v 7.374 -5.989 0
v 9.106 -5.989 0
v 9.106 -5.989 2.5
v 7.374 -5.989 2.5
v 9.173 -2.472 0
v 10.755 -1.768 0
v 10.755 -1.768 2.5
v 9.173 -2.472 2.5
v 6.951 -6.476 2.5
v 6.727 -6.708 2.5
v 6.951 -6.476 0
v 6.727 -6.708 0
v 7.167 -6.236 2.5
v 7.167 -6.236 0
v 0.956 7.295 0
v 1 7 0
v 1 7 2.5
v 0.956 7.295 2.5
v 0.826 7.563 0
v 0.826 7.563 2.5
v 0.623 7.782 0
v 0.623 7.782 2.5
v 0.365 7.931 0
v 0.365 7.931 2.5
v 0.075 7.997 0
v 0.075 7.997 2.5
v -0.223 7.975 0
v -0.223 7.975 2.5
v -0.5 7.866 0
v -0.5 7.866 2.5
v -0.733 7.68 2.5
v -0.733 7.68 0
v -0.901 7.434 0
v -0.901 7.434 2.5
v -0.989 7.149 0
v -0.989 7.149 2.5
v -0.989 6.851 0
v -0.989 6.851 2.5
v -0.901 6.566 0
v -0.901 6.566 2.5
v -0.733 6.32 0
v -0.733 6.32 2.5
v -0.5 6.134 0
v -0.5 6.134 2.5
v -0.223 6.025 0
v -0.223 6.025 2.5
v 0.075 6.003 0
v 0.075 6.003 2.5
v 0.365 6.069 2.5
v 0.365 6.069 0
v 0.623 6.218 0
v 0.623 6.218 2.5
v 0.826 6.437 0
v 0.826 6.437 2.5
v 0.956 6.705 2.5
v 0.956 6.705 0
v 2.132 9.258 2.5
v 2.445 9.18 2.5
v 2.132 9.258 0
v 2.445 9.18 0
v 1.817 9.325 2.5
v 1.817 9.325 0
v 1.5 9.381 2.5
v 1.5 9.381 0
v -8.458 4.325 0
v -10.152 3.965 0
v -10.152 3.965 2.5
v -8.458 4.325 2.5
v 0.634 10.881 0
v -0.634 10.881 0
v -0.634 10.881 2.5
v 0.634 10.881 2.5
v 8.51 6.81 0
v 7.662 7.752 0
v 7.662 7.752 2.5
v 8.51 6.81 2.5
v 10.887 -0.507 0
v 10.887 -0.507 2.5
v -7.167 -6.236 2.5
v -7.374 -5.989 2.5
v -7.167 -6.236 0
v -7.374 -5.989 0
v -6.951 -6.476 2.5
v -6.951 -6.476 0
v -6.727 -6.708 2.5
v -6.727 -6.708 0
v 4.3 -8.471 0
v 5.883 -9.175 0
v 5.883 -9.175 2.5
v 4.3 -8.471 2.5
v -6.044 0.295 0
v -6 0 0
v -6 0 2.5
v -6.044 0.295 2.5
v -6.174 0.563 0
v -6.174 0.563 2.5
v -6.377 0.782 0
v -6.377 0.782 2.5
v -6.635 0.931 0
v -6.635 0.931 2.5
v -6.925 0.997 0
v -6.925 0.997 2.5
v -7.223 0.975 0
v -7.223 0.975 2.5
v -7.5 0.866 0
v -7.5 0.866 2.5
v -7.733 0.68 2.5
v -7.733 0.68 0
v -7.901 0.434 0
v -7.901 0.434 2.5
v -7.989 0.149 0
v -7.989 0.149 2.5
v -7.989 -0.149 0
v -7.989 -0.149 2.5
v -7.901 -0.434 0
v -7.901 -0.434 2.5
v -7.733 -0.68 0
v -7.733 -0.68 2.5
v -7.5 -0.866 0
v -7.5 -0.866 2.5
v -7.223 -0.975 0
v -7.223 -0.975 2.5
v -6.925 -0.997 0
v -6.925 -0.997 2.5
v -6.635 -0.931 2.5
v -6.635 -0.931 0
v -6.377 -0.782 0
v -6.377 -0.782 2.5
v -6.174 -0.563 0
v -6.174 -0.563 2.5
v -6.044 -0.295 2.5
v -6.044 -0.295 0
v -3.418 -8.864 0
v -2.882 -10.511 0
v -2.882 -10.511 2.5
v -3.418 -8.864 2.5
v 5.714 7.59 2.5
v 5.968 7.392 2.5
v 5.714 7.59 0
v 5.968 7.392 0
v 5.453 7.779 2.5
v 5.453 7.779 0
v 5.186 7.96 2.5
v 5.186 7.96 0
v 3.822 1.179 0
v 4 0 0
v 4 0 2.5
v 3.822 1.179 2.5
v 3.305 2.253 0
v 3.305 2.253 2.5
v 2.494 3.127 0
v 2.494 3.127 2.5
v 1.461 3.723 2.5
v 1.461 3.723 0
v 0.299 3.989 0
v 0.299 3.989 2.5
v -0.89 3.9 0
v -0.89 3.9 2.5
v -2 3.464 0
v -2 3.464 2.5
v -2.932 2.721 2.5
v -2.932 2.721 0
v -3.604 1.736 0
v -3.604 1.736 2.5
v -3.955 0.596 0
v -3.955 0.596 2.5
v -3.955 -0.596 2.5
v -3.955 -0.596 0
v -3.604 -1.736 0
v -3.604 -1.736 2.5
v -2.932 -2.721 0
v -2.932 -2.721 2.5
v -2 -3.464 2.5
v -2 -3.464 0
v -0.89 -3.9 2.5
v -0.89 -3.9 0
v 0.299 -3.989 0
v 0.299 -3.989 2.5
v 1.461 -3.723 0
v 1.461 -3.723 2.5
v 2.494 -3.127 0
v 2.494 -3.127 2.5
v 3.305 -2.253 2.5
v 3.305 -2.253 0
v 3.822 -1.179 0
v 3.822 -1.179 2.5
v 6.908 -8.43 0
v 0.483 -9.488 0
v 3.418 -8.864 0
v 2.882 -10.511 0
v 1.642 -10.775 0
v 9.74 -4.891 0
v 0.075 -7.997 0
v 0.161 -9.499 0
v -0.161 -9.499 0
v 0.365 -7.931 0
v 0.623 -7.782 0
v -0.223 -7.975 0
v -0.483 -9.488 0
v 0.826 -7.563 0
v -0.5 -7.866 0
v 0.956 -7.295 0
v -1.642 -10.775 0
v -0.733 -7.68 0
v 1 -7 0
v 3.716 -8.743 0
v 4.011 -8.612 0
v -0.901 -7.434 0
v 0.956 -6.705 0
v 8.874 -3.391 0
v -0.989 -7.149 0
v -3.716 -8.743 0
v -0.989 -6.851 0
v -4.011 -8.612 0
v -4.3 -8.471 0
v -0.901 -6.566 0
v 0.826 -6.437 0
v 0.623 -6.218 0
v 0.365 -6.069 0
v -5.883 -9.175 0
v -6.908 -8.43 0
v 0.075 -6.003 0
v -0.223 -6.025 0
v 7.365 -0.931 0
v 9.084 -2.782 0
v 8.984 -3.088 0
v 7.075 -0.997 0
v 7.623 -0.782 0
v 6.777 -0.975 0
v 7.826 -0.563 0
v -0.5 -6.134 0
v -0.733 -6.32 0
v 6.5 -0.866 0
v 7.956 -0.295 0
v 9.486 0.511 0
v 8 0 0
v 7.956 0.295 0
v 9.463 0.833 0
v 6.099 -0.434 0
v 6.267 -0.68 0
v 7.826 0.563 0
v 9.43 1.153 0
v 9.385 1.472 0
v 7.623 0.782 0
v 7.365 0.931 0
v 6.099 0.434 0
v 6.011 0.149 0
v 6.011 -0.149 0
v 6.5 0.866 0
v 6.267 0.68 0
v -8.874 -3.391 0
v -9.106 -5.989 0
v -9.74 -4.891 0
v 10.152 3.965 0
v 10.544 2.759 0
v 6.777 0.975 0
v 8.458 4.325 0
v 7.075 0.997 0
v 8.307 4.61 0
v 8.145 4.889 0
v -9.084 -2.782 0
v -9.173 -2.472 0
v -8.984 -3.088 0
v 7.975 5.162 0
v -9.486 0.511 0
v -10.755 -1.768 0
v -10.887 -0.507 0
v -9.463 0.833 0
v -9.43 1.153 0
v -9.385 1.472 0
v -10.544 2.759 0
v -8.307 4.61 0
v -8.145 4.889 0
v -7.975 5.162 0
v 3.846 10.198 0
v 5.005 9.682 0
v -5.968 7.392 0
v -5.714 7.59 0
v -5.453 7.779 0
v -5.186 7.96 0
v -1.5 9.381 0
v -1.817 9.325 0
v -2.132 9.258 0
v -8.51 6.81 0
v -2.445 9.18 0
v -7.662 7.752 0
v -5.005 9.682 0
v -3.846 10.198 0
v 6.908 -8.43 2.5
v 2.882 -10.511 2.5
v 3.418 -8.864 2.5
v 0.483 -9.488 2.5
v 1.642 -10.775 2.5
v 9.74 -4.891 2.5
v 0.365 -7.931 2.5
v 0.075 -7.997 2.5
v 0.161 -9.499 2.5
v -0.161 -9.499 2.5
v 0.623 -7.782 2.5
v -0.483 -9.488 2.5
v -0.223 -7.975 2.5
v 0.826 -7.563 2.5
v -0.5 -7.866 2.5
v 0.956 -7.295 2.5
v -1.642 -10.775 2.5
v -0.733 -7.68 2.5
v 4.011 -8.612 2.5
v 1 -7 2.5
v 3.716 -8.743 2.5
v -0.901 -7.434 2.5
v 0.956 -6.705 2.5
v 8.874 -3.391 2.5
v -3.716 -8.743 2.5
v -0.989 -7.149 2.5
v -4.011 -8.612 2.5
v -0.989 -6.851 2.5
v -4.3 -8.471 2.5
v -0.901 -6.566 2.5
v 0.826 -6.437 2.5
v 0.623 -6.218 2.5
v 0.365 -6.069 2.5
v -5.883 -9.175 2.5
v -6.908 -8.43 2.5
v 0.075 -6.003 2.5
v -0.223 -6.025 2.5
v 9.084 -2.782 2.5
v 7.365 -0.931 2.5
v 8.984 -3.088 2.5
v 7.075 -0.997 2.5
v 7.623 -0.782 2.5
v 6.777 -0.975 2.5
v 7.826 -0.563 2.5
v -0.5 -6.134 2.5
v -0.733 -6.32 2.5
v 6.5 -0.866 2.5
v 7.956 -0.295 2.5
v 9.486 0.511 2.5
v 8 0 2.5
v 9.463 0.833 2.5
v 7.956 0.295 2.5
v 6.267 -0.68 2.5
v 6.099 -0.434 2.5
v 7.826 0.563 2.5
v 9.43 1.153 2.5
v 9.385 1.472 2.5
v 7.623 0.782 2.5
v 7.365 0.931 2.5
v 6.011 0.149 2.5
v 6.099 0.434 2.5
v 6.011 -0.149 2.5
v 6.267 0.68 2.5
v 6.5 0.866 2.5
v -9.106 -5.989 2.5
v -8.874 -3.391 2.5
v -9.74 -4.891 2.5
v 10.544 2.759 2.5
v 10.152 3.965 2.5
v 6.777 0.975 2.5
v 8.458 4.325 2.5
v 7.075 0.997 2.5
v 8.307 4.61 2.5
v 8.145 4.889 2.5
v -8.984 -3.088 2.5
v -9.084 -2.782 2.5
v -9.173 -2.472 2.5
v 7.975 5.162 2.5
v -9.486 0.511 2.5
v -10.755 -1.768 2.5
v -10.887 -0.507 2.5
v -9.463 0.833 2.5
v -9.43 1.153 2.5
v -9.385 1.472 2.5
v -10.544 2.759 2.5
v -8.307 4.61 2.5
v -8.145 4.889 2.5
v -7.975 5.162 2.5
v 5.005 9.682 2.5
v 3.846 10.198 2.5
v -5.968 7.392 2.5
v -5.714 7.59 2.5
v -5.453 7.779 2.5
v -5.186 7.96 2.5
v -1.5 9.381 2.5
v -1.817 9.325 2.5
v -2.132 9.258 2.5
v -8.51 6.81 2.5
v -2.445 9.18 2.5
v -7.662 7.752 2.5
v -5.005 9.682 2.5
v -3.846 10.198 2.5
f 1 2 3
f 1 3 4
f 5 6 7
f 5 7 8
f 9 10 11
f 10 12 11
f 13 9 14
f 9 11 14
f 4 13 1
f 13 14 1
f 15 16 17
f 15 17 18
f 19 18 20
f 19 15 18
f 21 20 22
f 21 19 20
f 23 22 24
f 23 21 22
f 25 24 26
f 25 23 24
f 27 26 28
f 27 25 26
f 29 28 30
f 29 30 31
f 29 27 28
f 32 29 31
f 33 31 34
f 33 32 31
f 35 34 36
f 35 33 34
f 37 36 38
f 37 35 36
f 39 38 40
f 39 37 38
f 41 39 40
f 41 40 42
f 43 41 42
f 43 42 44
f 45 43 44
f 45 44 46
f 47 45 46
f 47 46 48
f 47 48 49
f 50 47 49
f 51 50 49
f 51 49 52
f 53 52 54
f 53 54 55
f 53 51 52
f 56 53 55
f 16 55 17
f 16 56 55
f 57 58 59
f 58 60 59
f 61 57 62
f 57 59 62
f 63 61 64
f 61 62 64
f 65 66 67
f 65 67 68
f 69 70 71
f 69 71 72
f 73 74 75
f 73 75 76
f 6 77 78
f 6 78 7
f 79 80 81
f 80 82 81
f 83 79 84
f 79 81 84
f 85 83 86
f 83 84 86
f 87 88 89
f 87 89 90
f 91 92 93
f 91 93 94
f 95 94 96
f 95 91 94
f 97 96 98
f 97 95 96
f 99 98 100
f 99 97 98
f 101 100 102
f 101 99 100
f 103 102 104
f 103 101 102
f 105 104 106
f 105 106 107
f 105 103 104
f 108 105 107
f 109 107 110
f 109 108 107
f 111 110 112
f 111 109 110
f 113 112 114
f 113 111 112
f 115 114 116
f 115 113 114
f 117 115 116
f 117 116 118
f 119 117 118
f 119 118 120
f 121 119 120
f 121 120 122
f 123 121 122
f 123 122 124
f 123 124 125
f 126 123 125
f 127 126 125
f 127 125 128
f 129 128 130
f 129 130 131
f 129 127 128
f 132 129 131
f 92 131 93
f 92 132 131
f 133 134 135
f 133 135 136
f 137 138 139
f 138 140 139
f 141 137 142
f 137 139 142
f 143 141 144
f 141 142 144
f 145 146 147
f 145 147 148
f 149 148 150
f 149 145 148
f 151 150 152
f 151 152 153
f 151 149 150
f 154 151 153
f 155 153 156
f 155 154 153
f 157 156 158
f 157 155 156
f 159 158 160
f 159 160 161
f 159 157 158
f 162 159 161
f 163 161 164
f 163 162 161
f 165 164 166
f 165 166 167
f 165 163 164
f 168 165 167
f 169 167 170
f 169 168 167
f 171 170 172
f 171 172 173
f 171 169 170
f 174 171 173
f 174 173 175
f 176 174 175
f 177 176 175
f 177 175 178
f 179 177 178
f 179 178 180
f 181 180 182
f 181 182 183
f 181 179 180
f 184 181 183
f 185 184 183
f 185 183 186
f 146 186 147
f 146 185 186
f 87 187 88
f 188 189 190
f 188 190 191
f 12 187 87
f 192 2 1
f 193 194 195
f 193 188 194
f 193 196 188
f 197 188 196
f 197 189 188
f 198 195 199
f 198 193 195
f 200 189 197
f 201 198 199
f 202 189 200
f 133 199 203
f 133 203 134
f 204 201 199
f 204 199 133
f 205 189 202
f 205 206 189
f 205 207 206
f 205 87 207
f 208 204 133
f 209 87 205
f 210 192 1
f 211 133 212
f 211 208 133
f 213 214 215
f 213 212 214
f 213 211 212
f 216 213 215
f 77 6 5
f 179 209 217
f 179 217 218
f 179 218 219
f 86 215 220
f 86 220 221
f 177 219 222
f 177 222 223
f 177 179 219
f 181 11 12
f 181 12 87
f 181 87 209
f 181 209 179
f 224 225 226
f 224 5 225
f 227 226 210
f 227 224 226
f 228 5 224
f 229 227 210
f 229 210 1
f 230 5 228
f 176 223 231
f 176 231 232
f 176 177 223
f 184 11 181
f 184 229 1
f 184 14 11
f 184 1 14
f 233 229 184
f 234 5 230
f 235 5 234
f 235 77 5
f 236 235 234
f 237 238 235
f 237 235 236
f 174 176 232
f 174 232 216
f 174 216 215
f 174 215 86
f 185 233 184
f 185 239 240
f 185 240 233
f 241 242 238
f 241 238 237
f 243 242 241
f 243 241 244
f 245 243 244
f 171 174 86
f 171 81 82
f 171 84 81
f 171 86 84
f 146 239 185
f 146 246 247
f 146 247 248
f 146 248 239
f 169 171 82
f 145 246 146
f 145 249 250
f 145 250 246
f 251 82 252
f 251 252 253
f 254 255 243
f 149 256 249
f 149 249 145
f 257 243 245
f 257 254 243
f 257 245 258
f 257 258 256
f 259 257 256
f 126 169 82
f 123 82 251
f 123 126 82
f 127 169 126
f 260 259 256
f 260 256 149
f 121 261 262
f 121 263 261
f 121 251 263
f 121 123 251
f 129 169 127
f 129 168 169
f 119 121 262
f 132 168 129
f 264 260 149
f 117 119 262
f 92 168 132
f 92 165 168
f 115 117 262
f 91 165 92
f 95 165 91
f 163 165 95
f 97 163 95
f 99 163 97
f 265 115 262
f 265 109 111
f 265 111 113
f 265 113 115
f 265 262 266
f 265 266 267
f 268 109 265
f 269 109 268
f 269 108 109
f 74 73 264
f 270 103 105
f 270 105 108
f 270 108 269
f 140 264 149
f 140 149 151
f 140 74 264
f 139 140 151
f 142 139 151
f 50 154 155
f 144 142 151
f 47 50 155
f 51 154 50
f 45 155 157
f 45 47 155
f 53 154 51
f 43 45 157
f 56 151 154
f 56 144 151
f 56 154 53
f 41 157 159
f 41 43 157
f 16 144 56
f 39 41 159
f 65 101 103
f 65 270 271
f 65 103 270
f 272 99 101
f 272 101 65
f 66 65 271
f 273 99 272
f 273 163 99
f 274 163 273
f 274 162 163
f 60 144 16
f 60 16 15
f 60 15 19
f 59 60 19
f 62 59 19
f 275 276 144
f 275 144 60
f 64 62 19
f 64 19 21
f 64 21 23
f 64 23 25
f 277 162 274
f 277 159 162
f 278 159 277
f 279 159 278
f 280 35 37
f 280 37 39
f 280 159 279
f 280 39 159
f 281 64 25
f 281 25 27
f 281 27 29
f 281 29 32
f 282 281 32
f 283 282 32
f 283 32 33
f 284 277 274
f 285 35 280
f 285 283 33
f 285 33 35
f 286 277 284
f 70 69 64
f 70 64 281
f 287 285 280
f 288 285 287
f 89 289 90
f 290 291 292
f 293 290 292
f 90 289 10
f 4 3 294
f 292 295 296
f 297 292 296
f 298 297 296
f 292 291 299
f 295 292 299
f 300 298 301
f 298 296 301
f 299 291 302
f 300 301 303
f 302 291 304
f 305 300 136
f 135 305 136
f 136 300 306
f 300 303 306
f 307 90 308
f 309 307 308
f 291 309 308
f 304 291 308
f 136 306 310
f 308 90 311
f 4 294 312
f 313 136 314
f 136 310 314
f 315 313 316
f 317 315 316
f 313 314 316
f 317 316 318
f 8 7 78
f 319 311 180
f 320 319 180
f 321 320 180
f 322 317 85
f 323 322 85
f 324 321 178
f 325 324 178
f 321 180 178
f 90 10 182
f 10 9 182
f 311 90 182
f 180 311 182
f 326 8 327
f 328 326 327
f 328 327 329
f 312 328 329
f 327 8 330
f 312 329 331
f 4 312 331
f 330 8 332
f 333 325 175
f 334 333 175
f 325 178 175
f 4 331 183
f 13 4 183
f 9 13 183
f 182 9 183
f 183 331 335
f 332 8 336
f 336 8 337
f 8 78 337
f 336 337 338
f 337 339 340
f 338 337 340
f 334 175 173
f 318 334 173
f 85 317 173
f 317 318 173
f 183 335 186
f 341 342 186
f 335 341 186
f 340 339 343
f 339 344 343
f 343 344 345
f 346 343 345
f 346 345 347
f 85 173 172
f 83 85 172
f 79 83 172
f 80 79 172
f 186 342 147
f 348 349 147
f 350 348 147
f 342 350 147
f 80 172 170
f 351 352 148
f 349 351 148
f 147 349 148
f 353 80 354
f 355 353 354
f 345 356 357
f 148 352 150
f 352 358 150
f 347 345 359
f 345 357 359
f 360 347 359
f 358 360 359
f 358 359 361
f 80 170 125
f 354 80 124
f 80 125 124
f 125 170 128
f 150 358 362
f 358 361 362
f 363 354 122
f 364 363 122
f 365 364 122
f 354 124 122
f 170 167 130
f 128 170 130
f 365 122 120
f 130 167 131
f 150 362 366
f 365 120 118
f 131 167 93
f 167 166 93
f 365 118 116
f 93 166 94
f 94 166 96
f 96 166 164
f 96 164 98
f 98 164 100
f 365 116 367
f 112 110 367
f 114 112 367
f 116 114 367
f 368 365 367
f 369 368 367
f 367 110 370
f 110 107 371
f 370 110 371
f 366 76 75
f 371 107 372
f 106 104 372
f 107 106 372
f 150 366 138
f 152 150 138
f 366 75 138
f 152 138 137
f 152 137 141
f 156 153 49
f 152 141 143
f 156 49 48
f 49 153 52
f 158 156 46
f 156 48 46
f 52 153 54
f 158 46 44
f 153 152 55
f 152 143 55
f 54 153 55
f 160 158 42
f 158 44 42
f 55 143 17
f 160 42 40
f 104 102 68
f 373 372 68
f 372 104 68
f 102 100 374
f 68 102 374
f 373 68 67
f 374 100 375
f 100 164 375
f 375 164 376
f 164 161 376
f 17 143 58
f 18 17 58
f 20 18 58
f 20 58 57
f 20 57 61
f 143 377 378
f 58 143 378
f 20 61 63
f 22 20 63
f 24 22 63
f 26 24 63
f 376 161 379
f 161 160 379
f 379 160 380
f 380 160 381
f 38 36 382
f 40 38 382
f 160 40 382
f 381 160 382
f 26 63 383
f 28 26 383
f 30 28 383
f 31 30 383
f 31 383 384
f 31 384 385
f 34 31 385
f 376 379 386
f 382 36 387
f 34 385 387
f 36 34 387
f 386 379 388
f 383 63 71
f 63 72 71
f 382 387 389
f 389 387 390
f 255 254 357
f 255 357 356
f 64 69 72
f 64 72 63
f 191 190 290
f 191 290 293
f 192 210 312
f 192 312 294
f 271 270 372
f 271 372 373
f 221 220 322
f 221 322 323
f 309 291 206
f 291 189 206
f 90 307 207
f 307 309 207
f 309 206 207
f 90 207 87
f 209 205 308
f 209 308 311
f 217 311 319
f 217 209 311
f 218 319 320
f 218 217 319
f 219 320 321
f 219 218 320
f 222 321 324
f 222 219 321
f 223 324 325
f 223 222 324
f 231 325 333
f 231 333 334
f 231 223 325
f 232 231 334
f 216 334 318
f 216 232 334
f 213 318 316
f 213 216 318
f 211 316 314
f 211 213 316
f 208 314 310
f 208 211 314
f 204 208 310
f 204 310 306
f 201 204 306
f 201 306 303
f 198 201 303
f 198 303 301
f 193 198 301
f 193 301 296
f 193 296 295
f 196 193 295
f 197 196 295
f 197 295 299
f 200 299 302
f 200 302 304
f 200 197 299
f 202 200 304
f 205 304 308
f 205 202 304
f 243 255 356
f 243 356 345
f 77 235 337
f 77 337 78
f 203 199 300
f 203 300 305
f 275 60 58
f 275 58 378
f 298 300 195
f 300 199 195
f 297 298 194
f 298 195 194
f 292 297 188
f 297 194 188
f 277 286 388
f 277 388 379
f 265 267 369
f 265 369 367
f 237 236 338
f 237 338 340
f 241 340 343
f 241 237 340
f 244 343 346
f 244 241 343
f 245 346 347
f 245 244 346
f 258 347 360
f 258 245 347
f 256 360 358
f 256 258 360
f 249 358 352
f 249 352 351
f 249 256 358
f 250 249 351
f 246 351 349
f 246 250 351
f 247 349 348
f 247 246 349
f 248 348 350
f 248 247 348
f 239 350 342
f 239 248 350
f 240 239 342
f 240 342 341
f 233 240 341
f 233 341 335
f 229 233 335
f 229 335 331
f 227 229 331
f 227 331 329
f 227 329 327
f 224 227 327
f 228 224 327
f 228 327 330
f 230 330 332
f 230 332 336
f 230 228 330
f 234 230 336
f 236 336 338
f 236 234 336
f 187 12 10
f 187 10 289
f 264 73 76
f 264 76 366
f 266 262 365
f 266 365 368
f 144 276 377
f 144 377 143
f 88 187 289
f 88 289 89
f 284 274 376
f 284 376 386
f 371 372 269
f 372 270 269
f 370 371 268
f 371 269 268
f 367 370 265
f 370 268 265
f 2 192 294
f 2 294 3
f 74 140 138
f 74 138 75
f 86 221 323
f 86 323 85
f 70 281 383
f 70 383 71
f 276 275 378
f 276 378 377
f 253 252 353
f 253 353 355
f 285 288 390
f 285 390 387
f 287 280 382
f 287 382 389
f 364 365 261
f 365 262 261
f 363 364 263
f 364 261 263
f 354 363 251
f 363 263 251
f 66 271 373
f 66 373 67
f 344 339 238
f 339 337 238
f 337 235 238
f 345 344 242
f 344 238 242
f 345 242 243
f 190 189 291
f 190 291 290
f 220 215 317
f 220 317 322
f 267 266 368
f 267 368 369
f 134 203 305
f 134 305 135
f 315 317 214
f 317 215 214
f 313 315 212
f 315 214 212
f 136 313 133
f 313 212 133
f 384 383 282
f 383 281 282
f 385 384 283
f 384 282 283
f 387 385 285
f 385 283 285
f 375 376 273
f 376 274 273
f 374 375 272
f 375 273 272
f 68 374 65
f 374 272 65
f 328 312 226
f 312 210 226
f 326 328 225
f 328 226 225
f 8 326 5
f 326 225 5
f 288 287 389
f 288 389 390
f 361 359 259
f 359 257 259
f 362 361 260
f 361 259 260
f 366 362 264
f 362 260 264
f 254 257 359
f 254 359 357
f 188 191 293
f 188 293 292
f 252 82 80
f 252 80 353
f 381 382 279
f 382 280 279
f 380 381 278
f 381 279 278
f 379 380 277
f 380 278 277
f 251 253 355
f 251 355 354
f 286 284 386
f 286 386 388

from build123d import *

# Parameters (mm, degrees)
SKETCH1_R           = 9.5
SKETCH1_R_2         = 4
SKETCH1_R_3         = 1
BOSS_EXTRUDE1_DEPTH = 2.5
BOSS_EXTRUDE2_DEPTH = 2.5
CIRPATTERN1_COUNT   = 15


with BuildPart() as part:
    # Sketch1 → Boss-Extrude1 (new body)
    with BuildSketch(Plane.XY):
        Circle(SKETCH1_R)
        Circle(SKETCH1_R_2, mode=Mode.SUBTRACT)
        with Locations((0, 7)):
            Circle(SKETCH1_R_3, mode=Mode.SUBTRACT)
        with Locations((7, 0)):
            Circle(SKETCH1_R_3, mode=Mode.SUBTRACT)
        with Locations((0, -7)):
            Circle(SKETCH1_R_3, mode=Mode.SUBTRACT)
        with Locations((-7, 0)):
            Circle(SKETCH1_R_3, mode=Mode.SUBTRACT)
    extrude(amount=BOSS_EXTRUDE1_DEPTH)

    # Sketch2 → Boss-Extrude2 (add)
    with BuildSketch(Plane.XY):
        Polygon((-1.5, 9.38083152), (-0.633974596, 10.88083152), (0.633974596, 10.88083152), (1.5, 9.38083152), align=None)
    boss_extrude2 = extrude(amount=BOSS_EXTRUDE2_DEPTH)

    # CirPattern1: Boss-Extrude2 ×15 about axis
    cirpattern1_axis = Axis((0, 0, 0), (0, 0, 1))
    for i in range(1, CIRPATTERN1_COUNT):
        add(boss_extrude2.rotate(cirpattern1_axis, i * 360 / CIRPATTERN1_COUNT))


solid = part.part
